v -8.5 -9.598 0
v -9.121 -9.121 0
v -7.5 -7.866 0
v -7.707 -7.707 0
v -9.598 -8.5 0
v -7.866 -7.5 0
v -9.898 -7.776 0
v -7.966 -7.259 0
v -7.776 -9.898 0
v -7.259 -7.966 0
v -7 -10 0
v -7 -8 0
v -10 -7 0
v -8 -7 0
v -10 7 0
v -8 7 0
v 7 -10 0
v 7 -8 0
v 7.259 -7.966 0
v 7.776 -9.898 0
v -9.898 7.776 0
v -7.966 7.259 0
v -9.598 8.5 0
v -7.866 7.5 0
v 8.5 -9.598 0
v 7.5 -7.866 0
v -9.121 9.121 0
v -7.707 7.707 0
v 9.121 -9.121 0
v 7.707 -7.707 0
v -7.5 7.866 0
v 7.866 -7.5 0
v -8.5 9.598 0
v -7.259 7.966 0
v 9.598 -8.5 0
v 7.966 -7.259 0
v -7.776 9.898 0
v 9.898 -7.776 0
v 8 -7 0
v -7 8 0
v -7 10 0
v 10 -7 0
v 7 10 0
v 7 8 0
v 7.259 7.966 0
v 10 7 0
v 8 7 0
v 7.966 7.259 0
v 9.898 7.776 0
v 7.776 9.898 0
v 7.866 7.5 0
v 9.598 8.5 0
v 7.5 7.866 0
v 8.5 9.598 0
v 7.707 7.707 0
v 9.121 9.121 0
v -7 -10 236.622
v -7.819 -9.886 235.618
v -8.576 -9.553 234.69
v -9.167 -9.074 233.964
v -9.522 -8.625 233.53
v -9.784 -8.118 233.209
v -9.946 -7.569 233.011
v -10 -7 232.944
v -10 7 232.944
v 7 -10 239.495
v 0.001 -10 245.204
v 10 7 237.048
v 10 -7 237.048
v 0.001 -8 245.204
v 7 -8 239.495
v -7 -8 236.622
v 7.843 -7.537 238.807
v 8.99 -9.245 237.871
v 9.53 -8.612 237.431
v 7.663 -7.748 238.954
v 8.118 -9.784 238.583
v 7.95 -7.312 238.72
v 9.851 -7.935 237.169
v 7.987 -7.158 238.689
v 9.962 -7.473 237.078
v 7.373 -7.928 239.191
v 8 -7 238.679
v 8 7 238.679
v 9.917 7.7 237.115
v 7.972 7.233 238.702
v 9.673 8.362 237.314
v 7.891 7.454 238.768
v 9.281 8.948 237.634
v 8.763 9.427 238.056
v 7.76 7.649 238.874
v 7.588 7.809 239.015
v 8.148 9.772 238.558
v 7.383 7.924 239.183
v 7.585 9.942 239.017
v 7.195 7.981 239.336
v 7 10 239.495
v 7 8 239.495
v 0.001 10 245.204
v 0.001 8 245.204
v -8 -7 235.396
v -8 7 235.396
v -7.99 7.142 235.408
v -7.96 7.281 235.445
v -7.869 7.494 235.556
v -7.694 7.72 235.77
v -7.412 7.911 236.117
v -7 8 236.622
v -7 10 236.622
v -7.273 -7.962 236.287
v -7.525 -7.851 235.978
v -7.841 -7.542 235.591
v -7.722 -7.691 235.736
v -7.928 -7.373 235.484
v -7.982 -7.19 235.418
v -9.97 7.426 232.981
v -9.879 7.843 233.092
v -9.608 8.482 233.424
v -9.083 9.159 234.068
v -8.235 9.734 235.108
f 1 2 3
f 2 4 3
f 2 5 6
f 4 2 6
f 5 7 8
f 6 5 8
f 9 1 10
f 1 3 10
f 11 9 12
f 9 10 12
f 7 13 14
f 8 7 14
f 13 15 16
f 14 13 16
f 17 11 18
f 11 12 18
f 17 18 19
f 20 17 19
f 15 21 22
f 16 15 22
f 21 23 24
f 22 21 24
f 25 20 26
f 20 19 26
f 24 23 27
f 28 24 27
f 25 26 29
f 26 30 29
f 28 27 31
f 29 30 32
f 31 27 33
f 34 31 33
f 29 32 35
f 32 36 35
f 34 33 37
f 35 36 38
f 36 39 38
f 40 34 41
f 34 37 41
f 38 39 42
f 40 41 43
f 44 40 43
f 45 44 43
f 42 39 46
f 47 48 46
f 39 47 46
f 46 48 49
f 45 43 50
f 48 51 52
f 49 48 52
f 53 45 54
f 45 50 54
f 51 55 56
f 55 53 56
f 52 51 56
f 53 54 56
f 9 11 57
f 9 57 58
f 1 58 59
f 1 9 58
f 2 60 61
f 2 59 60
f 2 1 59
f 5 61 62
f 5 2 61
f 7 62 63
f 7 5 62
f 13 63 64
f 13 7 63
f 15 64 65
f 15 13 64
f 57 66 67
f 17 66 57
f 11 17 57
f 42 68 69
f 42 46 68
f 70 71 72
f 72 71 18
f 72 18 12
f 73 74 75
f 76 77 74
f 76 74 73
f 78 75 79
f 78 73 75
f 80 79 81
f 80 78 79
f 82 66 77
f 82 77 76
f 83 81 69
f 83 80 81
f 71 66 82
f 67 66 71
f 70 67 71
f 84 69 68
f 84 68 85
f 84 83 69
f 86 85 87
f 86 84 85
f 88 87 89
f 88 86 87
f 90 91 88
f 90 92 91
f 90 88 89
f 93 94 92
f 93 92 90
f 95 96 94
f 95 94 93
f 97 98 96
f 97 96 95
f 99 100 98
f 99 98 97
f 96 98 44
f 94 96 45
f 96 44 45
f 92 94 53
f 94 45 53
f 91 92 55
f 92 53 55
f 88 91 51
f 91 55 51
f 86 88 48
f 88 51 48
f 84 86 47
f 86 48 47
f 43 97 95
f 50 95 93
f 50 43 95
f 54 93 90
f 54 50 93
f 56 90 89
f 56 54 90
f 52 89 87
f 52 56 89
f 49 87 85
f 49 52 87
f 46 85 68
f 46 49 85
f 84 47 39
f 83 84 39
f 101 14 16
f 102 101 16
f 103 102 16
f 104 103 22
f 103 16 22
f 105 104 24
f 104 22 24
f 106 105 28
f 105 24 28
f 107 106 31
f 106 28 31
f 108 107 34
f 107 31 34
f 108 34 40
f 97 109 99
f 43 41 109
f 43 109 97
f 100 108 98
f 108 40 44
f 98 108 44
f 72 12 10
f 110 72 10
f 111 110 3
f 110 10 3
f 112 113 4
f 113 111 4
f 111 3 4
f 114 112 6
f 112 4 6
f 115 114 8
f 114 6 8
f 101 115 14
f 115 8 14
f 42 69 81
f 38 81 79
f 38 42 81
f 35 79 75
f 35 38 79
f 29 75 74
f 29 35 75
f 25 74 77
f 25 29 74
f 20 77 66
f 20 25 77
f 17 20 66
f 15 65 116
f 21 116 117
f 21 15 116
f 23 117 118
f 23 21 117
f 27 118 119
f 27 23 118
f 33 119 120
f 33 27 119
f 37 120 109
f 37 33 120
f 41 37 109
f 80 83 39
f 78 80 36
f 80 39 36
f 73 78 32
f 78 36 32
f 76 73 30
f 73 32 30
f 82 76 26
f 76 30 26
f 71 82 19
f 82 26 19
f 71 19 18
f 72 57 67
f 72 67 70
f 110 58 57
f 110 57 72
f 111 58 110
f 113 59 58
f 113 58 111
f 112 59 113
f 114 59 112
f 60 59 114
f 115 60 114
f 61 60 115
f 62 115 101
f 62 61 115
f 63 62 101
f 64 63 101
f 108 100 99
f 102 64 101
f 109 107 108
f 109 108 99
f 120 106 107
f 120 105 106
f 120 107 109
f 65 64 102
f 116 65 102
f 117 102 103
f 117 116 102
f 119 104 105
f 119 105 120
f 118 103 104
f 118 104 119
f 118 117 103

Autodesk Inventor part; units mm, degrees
ref_plane "Start Plane" through (0, 0, 0) normal (0, 0, 1) x (1, 0, 0)
ref_plane "End Plane" through (0, 0, 245.204) normal (0, 0, 1) x (1, 0, 0)
sketch "Sketch" plane through (0, 0, 0) normal (0, 0, 1) x (1, 0, 0)
  line L0 (-10, -7) -> (-10, 7)
  line L1 (-7, 10) -> (7, 10)
  line L2 (10, 7) -> (10, -7)
  line L3 (7, -10) -> (-7, -10)
  arc A0 (-10, -7) -> (-7, -10) centre (-7, -7) ccw
  arc A1 (-7, 10) -> (-10, 7) centre (-7, 7) ccw
  arc A2 (10, 7) -> (7, 10) centre (7, 7) ccw
  arc A3 (7, -10) -> (10, -7) centre (7, -7) ccw
  arc A4 (-7, 8) -> (-8, 7) centre (-7, 7) ccw
  line L4 (-7, 8) -> (7, 8)
  arc A5 (8, 7) -> (7, 8) centre (7, 7) ccw
  line L5 (8, 7) -> (8, -7)
  arc A6 (7, -8) -> (8, -7) centre (7, -7) ccw
  line L6 (7, -8) -> (-7, -8)
  arc A7 (-8, -7) -> (-7, -8) centre (-7, -7) ccw
  line L7 (-8, -7) -> (-8, 7)
  line L8 (0, 14.8698) -> (0, -14.8698) construction
  line L9 (-14.8698, 0) -> (14.8698, 0) construction
  dimension "d7" = 3
  dimension "d10" = 20
  dimension "d11" = 20
  dimension "d12" = 2
  dimension "d15" = 10
  dimension "d16" = 10
extrude "Body" add sketch "Sketch" along normal up to surface (245.204 mm away) from surface at 0
sketch "Sketch3" plane through (0, 0, 0) normal (0, 0, 1) x (1, 0, 0)
  line L0 (0, 0) -> (10, 0)
ref_plane "Work Plane3" through (0, 0, 0) normal (0, -1, 0) x (1, 0, 0)
sketch "Sketch4" plane through (0, 0, 0) normal (0, -1, 0) x (1, 0, 0)
  line L0 (-2, 0) -> (12, 0)
  line L1 (-2, 245.204) -> (12, 245.204)
  dimension "d18" = 245.204
ref_plane "Work Plane4" through (10, 0, 257.4621) normal (-0.7749, 0, 0.6321) x (0.6321, 0, 0.7749)
split "Split1" plane through (10, 0, 257.4621) removes the side toward (-0.7749, 0, 0.6321)
ref_plane "Work Plane5" through (-10, 0, 253.3619) normal (0.6321, 0, 0.7749) x (0.7749, 0, -0.6321)
split "Split2" plane through (-10, 0, 253.3619) removes the side toward (0.6321, 0, 0.7749)
equation "\"d7\" = G_IR"
equation "\"d10\" = G_H"
equation "\"d11\" = G_W"
equation "\"d12\" = G_T"
equation "\"d15\" = 0.5 * d10"
equation "\"d16\" = 0.5 * d11"
equation "\"d3\" = G_L"
equation "\"G_W\" = 20"
equation "\"G_H\" = 20"
equation "\"G_T\" = 2"
equation "\"G_IR\" = 3"
equation "\"G_L\" = d18"
equation "\"G_OFFSET_START\" = 0"
equation "\"G_OFFSET_END\" = 0"
equation "\"d14\" = G_OFFSET_END + B_L"
equation "\"B_L\" = 245.204"
properties part number "ISO 12633-2 - 20x20x2 - 245.2" material "Steel, Mild"
